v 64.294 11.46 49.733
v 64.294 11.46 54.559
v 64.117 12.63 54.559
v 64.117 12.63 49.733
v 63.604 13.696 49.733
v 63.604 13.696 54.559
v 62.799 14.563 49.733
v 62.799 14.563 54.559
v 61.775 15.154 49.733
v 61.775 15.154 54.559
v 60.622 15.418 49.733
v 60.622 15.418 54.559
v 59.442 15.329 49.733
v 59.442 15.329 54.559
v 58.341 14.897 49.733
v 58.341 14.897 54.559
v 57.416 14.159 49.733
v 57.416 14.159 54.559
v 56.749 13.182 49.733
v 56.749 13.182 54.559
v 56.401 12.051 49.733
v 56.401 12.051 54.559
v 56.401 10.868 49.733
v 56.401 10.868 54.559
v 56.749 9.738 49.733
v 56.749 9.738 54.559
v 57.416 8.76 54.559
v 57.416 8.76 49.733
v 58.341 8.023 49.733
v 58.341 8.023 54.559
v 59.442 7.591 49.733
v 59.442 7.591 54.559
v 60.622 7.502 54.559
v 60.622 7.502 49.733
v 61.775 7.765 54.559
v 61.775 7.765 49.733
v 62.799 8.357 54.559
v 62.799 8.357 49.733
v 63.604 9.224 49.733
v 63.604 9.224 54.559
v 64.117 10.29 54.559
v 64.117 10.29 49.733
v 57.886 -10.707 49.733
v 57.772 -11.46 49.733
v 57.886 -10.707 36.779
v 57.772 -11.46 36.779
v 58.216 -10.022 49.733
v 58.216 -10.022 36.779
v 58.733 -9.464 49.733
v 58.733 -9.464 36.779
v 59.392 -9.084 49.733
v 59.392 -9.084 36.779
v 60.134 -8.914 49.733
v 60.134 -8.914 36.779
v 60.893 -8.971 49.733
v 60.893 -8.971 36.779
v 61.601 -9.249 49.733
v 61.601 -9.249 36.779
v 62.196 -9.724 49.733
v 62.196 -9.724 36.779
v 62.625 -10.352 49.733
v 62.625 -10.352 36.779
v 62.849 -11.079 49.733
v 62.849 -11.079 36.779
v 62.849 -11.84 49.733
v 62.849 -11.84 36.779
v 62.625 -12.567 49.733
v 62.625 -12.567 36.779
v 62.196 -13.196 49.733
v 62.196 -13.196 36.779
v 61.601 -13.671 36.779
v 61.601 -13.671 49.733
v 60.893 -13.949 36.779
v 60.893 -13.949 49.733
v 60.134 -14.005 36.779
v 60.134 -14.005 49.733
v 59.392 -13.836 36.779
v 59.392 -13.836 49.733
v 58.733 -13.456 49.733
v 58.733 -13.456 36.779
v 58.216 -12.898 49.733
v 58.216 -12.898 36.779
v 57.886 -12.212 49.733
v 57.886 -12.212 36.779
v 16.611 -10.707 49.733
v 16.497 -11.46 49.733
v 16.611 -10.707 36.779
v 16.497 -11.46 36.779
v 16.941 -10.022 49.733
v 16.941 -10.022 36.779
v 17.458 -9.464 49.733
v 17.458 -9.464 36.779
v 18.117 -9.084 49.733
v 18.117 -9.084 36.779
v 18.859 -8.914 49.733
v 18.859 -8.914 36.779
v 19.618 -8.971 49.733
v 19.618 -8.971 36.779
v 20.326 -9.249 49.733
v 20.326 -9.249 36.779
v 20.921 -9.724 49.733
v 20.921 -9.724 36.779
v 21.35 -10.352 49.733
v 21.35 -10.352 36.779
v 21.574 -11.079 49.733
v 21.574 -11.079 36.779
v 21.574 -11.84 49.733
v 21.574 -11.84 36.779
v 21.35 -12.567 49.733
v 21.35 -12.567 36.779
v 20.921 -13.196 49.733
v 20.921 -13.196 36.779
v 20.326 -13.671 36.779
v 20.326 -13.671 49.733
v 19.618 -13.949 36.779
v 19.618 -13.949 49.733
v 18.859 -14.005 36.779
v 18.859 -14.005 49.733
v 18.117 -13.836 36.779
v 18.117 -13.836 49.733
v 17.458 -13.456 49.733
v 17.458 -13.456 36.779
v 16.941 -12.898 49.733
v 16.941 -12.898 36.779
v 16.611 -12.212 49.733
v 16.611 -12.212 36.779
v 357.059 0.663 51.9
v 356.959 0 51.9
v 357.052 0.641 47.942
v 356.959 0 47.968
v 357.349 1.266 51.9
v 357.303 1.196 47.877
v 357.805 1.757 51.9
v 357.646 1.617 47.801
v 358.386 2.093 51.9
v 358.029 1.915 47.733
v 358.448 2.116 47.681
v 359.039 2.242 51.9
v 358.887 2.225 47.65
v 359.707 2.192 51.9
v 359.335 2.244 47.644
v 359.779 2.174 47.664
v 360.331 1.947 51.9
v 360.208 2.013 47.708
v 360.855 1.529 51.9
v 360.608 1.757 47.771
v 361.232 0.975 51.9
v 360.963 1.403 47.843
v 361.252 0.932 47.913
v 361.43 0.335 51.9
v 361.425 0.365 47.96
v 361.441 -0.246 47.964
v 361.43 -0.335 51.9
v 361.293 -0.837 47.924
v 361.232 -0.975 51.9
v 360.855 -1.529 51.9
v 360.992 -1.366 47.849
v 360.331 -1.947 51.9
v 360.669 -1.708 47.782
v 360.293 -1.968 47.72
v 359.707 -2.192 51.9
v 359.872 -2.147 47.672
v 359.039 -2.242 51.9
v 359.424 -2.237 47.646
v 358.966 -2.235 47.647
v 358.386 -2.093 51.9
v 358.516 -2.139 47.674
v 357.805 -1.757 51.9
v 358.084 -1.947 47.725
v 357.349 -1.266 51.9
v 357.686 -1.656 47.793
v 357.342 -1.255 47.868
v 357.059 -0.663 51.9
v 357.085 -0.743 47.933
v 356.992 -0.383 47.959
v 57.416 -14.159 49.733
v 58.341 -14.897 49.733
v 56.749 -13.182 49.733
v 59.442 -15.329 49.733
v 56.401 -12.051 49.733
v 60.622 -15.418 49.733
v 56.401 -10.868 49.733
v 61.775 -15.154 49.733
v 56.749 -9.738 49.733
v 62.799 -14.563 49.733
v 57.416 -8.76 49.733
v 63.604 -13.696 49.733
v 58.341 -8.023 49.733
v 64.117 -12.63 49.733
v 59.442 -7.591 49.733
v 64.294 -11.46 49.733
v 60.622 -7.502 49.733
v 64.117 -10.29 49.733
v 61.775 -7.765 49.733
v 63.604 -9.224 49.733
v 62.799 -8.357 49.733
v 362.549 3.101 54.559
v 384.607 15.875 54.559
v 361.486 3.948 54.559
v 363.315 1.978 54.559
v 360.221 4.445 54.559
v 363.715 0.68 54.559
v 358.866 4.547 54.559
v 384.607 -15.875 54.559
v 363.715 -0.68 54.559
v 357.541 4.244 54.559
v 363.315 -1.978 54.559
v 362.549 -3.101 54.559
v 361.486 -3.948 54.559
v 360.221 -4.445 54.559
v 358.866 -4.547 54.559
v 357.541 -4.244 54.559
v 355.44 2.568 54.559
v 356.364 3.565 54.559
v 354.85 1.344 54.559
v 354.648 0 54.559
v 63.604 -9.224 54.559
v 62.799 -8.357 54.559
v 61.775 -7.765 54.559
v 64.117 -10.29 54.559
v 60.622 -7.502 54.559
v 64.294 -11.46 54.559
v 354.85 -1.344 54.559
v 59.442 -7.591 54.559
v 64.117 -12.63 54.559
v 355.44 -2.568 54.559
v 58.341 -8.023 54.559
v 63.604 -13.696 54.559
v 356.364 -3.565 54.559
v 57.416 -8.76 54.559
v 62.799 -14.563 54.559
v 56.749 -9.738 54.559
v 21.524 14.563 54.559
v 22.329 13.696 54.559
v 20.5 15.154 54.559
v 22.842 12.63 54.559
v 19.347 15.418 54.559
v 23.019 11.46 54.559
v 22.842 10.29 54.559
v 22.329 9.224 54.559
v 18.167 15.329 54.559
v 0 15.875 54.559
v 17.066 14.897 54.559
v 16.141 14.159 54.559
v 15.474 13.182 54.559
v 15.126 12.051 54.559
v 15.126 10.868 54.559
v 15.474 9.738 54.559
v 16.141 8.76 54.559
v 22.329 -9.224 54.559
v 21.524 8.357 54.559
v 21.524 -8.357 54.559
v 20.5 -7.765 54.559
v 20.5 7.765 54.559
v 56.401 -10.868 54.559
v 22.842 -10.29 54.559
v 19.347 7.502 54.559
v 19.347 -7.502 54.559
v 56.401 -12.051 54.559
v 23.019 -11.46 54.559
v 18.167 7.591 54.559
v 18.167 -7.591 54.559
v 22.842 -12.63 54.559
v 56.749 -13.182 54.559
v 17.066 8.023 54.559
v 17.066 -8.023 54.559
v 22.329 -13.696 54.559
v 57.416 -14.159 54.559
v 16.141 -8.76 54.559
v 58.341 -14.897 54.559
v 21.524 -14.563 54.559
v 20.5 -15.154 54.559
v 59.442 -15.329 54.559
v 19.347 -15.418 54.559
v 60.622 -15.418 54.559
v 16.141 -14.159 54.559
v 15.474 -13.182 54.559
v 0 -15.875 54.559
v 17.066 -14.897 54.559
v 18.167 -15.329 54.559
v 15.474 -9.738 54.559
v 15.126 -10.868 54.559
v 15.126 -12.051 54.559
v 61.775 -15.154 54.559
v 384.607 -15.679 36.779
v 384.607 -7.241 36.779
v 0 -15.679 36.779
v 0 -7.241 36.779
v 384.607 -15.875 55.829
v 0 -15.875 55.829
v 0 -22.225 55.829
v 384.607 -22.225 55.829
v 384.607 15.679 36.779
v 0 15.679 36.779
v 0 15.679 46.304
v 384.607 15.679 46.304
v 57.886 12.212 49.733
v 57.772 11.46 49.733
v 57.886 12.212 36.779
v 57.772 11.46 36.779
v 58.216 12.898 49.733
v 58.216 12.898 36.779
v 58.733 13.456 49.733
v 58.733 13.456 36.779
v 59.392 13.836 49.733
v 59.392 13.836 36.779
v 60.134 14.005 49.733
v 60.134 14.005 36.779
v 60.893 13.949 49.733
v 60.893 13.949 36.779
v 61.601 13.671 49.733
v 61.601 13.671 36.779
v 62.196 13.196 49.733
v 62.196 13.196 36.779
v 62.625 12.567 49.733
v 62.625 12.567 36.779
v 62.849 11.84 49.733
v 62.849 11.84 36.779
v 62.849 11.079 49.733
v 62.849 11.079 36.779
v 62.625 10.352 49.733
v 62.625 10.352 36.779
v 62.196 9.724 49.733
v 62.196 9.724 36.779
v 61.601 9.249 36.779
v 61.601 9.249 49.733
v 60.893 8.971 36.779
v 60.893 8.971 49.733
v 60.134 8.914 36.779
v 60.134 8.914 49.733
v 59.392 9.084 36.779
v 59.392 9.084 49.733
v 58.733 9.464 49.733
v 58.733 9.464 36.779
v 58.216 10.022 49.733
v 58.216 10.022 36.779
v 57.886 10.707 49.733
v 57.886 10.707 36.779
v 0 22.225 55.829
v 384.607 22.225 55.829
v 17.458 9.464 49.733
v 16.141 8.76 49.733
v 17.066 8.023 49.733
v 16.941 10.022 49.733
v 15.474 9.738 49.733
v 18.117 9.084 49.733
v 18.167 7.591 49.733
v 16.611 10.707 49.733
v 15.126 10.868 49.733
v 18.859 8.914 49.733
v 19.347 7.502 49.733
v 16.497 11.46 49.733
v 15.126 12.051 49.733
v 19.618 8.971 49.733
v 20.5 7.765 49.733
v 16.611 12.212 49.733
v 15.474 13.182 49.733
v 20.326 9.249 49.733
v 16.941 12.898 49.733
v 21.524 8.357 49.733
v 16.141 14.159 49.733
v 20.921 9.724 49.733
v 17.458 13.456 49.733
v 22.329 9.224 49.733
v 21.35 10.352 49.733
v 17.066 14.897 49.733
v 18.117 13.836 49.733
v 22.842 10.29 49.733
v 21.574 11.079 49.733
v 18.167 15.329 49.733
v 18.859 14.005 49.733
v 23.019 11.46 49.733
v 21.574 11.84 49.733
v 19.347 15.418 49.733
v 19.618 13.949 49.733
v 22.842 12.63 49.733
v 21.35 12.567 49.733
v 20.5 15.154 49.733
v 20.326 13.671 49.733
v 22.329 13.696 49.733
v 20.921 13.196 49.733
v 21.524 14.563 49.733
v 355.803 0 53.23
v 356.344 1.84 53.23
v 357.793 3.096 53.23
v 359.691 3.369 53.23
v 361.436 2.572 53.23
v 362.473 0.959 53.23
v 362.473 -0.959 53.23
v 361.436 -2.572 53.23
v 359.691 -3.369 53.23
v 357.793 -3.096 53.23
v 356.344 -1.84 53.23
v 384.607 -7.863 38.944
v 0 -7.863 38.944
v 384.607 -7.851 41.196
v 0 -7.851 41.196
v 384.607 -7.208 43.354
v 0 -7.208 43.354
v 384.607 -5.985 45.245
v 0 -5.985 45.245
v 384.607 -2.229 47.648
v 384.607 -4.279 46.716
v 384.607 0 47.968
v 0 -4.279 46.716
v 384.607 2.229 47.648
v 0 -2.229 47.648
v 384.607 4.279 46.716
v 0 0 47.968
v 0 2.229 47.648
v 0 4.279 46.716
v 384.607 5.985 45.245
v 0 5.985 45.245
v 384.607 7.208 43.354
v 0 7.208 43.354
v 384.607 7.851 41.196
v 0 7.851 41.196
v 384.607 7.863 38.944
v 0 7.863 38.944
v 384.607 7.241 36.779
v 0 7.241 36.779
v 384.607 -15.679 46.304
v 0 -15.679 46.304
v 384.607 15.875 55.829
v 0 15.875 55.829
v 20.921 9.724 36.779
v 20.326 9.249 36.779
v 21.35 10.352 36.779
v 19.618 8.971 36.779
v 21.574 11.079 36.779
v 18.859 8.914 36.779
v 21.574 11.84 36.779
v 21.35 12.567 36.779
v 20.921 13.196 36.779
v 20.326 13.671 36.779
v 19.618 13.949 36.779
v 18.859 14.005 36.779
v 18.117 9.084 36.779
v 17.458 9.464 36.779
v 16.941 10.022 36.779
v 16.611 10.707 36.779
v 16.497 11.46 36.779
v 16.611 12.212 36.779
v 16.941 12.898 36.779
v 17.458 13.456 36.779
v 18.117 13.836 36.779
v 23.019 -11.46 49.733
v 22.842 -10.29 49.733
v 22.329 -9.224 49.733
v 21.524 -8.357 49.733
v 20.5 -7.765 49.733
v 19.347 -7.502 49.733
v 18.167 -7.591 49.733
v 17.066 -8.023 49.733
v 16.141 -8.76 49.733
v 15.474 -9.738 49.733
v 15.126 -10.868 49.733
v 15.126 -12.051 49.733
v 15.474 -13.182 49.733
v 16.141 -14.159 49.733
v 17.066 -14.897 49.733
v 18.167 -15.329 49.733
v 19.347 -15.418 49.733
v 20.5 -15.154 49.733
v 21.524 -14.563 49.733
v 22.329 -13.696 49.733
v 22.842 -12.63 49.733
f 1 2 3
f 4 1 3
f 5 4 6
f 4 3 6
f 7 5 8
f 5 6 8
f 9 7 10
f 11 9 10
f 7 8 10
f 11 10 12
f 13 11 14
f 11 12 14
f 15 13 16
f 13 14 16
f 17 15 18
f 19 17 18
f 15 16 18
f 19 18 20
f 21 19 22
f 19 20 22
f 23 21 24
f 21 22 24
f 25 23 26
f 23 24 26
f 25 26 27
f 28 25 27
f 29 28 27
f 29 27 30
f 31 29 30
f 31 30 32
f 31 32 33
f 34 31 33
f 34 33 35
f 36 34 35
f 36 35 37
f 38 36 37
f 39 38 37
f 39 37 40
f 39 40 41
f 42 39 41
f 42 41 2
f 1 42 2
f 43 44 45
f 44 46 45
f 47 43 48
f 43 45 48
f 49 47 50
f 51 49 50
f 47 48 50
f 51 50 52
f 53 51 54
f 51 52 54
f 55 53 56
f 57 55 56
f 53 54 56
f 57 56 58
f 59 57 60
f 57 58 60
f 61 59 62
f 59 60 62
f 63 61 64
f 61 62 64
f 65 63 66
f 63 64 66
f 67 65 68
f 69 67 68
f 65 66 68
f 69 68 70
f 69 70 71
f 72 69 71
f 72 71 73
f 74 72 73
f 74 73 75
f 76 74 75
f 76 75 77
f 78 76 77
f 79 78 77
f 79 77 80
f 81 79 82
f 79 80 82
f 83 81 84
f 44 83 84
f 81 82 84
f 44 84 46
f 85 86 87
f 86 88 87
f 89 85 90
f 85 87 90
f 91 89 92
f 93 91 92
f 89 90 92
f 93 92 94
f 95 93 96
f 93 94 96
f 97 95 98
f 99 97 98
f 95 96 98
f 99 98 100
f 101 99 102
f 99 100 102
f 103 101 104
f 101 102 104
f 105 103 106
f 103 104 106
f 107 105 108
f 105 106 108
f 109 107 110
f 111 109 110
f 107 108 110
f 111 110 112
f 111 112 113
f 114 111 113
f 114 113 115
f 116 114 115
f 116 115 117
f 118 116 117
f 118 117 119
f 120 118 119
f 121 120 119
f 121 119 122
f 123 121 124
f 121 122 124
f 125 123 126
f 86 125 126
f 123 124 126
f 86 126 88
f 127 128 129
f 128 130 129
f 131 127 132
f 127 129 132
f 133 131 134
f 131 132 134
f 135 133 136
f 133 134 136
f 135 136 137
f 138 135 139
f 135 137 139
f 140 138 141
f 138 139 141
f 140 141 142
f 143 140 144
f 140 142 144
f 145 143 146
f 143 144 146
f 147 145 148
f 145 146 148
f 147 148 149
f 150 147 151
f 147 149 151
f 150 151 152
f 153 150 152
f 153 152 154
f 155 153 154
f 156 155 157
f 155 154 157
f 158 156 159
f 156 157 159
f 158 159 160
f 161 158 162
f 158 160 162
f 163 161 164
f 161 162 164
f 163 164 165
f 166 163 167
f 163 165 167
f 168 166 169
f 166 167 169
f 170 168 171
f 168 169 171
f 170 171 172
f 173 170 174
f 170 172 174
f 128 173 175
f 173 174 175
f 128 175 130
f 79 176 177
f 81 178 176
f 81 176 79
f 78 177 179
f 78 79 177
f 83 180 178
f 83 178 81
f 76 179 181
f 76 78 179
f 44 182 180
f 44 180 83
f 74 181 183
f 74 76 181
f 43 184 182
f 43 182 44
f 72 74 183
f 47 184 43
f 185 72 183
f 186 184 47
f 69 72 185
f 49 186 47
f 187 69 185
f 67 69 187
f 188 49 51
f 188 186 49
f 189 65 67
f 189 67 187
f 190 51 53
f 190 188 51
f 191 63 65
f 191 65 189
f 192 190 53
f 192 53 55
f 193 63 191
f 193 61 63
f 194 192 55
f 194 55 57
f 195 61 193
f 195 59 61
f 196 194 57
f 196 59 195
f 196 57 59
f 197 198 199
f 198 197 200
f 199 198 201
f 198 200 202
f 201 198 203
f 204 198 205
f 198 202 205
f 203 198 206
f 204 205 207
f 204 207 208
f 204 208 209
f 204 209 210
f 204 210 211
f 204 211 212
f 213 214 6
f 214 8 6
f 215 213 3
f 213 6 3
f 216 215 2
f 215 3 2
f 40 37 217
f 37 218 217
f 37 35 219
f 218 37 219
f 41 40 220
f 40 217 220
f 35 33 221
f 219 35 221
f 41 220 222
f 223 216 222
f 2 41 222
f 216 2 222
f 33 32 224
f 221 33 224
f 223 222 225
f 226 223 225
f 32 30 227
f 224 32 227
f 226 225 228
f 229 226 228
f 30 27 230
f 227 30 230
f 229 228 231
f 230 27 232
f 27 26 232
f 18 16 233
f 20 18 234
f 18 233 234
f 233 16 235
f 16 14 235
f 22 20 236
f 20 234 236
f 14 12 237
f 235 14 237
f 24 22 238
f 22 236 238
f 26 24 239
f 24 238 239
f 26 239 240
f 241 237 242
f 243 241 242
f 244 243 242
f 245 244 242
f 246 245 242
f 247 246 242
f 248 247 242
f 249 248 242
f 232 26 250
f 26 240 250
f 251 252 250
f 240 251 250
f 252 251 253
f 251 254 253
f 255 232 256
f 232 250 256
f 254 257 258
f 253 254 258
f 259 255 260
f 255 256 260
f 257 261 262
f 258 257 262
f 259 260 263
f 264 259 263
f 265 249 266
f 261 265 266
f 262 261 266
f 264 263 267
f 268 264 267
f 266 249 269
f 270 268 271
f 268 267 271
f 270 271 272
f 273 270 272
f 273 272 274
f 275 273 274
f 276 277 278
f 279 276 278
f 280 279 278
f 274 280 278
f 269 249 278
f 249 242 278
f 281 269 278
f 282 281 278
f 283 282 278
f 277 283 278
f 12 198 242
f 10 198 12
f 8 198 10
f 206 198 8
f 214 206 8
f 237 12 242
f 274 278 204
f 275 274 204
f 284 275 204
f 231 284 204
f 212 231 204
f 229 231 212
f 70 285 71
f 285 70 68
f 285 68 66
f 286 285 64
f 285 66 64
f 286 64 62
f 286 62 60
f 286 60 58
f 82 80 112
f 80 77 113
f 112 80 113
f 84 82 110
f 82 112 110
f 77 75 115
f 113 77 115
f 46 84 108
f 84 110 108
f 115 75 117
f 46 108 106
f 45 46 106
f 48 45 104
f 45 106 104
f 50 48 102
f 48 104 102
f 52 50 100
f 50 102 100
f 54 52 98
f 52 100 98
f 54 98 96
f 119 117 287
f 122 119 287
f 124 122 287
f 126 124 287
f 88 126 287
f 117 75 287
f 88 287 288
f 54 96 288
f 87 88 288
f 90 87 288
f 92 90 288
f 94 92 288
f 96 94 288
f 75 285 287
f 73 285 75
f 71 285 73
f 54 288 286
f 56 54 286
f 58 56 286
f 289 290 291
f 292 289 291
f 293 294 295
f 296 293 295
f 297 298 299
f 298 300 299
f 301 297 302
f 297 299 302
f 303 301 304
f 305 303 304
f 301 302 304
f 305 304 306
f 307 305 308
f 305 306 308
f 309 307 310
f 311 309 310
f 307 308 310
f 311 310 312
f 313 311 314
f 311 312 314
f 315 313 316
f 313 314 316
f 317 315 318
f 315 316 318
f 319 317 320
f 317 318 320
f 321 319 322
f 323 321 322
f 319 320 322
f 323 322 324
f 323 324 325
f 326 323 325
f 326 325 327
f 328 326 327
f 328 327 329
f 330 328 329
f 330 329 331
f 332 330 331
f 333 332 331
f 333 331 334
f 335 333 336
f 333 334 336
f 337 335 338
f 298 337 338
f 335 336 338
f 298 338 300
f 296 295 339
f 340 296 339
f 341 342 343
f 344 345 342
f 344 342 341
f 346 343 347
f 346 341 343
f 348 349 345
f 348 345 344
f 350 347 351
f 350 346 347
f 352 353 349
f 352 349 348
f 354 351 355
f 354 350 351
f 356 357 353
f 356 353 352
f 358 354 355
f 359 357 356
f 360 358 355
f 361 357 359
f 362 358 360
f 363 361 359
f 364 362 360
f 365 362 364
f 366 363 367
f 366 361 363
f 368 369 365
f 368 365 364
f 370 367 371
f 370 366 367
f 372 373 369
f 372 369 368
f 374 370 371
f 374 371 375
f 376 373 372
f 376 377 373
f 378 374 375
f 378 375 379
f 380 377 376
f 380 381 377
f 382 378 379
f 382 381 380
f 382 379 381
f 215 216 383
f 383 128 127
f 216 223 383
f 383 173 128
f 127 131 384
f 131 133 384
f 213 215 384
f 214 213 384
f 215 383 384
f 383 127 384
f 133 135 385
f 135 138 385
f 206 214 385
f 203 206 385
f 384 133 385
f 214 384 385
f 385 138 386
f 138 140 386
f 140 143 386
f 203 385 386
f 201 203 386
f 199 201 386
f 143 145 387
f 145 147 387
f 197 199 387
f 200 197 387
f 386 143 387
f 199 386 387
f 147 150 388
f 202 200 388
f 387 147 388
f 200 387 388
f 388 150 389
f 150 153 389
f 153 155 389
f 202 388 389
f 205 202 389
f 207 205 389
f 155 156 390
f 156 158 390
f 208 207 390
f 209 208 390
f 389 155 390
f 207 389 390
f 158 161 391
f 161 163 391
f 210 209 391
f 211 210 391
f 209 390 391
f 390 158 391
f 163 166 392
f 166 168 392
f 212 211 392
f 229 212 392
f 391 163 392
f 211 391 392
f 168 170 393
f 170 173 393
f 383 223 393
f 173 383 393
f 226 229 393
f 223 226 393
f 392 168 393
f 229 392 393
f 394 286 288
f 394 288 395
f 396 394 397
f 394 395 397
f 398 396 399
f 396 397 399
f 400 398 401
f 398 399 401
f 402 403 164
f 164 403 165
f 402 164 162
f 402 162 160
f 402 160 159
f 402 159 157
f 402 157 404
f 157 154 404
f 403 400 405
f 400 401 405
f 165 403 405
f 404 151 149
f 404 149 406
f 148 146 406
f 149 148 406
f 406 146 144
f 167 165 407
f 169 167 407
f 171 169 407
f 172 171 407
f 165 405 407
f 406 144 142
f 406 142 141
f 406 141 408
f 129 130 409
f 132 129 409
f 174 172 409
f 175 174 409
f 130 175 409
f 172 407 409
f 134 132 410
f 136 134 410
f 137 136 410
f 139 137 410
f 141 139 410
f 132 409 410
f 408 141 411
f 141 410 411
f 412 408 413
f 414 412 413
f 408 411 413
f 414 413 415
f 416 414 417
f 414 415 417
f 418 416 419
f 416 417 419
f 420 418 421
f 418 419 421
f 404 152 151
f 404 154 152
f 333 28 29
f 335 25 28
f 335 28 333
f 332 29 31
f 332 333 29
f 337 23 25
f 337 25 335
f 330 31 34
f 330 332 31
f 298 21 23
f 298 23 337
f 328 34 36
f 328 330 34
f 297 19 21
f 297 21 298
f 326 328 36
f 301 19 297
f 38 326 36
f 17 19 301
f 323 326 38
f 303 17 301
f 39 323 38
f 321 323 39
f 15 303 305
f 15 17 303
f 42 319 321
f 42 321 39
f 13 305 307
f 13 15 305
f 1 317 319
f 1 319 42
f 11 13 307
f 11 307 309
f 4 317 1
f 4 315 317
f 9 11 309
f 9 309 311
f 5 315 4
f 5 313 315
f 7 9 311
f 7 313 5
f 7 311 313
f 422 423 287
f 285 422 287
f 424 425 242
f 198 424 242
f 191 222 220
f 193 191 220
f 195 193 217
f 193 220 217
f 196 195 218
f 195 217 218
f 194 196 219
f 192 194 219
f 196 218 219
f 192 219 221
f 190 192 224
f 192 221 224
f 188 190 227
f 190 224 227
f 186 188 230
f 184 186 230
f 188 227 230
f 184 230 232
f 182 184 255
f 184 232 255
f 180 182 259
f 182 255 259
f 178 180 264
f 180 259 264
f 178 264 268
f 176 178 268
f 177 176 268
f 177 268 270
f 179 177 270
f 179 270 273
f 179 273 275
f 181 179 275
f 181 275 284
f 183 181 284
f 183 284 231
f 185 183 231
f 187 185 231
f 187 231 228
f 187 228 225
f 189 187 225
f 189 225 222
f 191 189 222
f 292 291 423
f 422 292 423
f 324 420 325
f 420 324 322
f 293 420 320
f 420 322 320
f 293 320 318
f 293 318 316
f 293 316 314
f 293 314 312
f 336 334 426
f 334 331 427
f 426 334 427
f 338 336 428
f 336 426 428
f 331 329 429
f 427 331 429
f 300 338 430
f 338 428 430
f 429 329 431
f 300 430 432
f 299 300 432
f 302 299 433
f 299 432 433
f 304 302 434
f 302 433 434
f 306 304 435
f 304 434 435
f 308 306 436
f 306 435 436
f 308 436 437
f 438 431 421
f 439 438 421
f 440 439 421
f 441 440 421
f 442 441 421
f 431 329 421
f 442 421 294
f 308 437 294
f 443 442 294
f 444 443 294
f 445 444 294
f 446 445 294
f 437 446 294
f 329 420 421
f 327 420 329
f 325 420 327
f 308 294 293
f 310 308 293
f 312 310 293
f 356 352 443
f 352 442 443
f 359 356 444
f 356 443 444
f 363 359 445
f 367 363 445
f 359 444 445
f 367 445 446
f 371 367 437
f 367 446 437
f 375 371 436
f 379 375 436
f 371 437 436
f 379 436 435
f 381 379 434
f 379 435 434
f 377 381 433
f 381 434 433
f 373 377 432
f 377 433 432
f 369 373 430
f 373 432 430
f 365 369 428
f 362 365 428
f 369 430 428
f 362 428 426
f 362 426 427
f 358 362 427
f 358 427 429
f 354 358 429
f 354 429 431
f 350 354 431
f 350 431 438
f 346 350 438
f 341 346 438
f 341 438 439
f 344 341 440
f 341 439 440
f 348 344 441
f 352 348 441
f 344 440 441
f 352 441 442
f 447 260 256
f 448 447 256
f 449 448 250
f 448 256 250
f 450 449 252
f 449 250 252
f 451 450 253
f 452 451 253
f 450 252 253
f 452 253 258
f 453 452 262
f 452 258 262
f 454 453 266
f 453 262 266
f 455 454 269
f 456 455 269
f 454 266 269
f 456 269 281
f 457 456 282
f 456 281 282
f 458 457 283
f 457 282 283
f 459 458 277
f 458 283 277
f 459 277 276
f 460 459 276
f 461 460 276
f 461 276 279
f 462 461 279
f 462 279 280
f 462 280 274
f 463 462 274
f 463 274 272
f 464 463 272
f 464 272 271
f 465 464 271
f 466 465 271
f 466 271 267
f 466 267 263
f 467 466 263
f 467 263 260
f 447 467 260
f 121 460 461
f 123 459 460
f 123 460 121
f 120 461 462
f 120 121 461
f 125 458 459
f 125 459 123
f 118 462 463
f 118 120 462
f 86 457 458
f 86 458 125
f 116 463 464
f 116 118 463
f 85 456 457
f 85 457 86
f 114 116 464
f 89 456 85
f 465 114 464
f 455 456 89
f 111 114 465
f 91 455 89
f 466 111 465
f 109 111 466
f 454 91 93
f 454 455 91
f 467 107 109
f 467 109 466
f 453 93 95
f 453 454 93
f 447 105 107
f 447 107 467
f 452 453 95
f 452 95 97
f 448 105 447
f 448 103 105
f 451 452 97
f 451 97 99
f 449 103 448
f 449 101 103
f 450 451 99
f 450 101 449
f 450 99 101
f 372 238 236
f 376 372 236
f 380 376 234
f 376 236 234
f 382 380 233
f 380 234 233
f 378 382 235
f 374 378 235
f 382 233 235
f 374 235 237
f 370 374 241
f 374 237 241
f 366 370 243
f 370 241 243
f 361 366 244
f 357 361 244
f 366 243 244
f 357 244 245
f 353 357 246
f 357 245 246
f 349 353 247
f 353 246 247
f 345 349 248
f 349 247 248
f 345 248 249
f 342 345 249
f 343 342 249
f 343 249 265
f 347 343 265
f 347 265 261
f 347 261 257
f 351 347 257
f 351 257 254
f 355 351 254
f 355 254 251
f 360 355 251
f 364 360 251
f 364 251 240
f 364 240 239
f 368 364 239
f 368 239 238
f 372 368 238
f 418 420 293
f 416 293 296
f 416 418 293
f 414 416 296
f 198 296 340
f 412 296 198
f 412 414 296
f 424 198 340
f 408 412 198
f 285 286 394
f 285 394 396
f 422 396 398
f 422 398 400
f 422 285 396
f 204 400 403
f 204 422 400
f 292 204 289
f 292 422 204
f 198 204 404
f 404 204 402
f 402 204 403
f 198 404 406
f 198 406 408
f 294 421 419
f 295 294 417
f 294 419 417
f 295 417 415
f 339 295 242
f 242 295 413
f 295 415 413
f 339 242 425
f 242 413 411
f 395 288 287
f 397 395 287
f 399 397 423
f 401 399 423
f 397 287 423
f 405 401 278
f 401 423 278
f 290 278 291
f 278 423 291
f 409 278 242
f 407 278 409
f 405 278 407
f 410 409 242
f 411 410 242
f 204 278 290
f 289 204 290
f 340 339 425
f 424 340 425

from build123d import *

# Parameters (mm, degrees)
F5_D           = 4.4958
F5_START       = 1.27
F5_CSINK_D     = 9.1186
F5_CSINK_ANGLE = 82
F9_D           = 5.1054
F9_CBORE_D     = 7.9375
F9_CBORE_DEPTH = 4.826


# Not quite as in the source:
# - a feature names something its author has since deleted; it is built from what else it names


with BuildPart() as f2:
    # F2: sweep along a path in F0
    with BuildLine(Plane.XZ) as f2_path:
        Line((384.6068, 55.8292), (0, 55.8292))
    # F1 (on Right) → F2 (sweep)
    with BuildSketch(Plane.YZ):
        with BuildLine():
            Line((15.875, 54.5592), (0, 54.5592))
            Line((0, 54.5592), (-15.875, 54.5592))
            Line((-15.875, 54.5592), (-15.875, 55.8292))
            Line((-15.875, 55.8292), (-22.225, 55.8292))
            Line((-22.225, 55.8292), (-15.6786488693, 46.3042))
            Line((-15.6786488693, 46.3042), (-15.6786488693, 36.7792))
            Line((-15.6786488693, 36.7792), (-7.2411052202, 36.7792))
            ThreePointArc((-7.2411052202, 36.7792), (0, 47.9679), (7.2411052202, 36.7792))
            Line((7.2411052202, 36.7792), (15.6786488693, 36.7792))
            Line((15.6786488693, 36.7792), (15.6786488693, 46.3042))
            Line((15.6786488693, 46.3042), (22.225, 55.8292))
            Line((22.225, 55.8292), (15.875, 55.8292))
            Line((15.875, 55.8292), (15.875, 54.5592))
        make_face()
    sweep(path=f2_path.line)

    # F5 (through all)
    # its depths count from where the whole tool has entered the part; down to there all is cleared
    with Locations(Plane.XY.offset(55.8292).offset(-F5_START)):
        with Locations((359.2068, 0)):
            CounterSinkHole(F5_D / 2, F5_CSINK_D / 2, counter_sink_angle=F5_CSINK_ANGLE)

    # F9 (through all)
    with Locations(Plane.XY.offset(54.5592)):
        with Locations((60.325, 11.4598770448), (60.325, -11.4598770448), (19.05, -11.4598770448), (19.05, 11.4598770448)):
            CounterBoreHole(F9_D / 2, F9_CBORE_D / 2, F9_CBORE_DEPTH)


solid = f2.part
